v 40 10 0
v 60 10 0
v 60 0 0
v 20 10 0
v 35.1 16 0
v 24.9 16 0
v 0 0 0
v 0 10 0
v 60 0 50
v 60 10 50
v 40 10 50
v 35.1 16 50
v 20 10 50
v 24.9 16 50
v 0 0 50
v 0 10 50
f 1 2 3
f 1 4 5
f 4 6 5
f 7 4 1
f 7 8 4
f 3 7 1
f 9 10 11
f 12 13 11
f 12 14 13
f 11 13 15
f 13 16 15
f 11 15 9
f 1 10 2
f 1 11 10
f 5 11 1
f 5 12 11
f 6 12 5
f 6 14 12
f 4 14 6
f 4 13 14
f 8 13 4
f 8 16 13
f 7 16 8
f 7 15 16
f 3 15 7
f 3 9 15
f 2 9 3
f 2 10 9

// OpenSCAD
$fn = 32;

// ----------------------------------------------------------------------
// V guide rail: dovetail, 60 mm wide
// ----------------------------------------------------------------------

// --- parameters (mm) ---
rail_w = 60;              // rail width, X
base_t = 10;              // base plate thickness
v_depth = 6;              // V feature depth / height
v_half_w = 10;            // half width of the V at the base face
plate_t = 50;             // rail length, Z (the extrusion height)
top_half_w = 5.1;         // half width at the dovetail top

dovetail_base = 2 * v_half_w;  // dovetail width at the base
dovetail_top = 2 * top_half_w;  // dovetail width at the top

profile = [[0, 0], [60, 0], [60, 10], [40, 10], [35.1, 16], [24.9, 16], [20, 10], [0, 10]];  // primary outline, 8 points, counter clockwise

// --- the one profile operation ---
linear_extrude(height = plate_t) polygon(points = profile);
